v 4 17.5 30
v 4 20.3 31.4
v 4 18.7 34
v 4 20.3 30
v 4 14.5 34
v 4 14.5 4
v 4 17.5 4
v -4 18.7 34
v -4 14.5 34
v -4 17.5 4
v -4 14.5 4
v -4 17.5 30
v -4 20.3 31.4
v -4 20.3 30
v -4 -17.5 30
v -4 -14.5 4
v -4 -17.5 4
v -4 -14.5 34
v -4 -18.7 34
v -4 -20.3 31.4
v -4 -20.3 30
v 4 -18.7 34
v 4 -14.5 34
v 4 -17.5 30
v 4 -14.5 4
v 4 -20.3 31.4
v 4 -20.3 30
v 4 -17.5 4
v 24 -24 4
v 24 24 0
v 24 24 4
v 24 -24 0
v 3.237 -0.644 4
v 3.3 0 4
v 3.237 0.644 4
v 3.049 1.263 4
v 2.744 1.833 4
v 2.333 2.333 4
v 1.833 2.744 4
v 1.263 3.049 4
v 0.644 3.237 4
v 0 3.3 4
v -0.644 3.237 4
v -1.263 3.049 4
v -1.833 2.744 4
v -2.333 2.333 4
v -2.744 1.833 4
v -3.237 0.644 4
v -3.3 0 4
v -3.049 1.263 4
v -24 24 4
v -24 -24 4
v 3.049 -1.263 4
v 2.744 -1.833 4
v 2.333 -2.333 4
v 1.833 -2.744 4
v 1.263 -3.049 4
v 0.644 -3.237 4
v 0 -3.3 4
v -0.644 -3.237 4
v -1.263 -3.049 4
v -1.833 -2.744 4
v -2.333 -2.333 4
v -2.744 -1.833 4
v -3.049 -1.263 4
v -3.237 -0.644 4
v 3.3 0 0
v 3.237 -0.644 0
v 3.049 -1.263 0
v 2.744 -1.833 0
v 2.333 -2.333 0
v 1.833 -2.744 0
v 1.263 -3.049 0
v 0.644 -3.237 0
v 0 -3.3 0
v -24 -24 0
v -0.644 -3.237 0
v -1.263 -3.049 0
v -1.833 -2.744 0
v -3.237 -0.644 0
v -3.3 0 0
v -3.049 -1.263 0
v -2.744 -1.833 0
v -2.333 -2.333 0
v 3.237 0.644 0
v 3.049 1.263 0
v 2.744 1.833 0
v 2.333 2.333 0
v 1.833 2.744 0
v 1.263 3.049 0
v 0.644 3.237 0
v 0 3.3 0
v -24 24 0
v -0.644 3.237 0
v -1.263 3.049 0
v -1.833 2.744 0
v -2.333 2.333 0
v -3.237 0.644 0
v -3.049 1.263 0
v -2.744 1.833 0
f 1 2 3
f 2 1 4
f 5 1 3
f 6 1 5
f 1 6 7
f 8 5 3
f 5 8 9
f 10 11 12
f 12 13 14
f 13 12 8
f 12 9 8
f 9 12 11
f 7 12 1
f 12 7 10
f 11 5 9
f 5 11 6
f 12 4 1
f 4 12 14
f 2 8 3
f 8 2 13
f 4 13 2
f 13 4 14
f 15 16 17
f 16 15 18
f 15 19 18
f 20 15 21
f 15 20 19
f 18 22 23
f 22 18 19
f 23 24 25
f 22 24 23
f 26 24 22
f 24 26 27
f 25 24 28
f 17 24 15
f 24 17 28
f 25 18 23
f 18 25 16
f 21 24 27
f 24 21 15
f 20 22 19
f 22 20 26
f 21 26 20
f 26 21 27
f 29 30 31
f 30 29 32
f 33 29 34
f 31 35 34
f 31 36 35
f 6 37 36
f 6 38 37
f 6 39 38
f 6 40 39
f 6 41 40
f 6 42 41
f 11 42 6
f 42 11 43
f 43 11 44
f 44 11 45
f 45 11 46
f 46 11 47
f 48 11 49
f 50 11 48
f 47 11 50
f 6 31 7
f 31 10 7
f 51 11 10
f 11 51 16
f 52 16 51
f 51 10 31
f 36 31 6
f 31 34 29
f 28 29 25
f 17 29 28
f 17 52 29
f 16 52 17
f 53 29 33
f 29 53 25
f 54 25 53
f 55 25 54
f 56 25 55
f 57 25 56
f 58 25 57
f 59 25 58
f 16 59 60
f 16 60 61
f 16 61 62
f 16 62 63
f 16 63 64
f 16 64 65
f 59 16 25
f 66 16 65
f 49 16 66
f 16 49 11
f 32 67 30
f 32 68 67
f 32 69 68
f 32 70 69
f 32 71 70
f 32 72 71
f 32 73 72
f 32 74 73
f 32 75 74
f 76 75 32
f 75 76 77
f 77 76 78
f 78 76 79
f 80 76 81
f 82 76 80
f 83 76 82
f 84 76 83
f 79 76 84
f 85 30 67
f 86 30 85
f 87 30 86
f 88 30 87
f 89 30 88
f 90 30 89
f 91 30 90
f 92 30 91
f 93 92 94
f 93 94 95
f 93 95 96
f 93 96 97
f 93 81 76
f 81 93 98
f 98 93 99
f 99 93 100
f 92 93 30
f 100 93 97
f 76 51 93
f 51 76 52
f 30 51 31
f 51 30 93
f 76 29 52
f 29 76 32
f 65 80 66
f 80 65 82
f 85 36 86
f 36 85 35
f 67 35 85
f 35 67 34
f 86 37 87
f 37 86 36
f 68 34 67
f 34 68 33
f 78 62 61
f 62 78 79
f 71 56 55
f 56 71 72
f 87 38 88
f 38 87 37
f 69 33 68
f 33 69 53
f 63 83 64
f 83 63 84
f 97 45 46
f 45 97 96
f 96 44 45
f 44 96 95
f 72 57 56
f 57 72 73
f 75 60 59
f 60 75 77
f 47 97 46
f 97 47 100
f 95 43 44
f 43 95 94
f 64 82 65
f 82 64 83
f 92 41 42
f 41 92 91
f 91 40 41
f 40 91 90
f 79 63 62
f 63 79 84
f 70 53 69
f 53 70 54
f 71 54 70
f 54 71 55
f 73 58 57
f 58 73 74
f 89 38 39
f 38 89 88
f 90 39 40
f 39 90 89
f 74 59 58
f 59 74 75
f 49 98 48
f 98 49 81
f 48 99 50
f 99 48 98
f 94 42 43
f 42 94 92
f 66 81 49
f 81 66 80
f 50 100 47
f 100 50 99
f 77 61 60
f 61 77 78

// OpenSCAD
$fn = 32;

// ----------------------------------------------------------------------
// Snap-fit latch: 2 arms, 30 mm tall, 3 mm undercut hooks
// ----------------------------------------------------------------------

// --- parameters (mm) ---
base_d = 48;              // base plate depth
base_h = 4;               // base plate thickness
span = 32;                // distance between opposite arms
arm_t = 3;                // arm thickness
arm_d = 8;                // arm width
height = 30;              // free arm length
head_len = 3;             // hook reach
head_h = 4;               // hook height
lead = 1.4;               // lead-in ramp thickness
bore_d = 6.6;             // base fixing bore
top_z = 34;               // height of the arm tips above the base

arms = 2;

difference() {
  union() {
    /* base plate, centred on the arm ring */
    translate([-24, -24, 0]) cube([base_d, base_d, base_h]);
    for (a = [0 : 360 / arms : 359]) rotate([0, 0, a]) {
    /* arm, sunk 0.5 mm into the base */
    translate([-arm_d / 2, span / 2 - arm_t / 2, base_h - 0.5]) cube([arm_d, arm_t, height + 0.5]);
    /* hook: a convex hull of a tall inner block and a thin outer lip
       gives a flat undercut below and a lead-in ramp on top */
    hull() {
      translate([-arm_d / 2, span / 2 + arm_t / 2 - 0.6, top_z - head_h]) cube([arm_d, lead + 0.4, head_h]);
      translate([-arm_d / 2, span / 2 + arm_t / 2 - 0.2, top_z - head_h]) cube([arm_d, head_len, lead]);
    }
    }
  }
  translate([0, 0, -2.5]) cylinder(h = base_h + 5, d = bore_d);
}
